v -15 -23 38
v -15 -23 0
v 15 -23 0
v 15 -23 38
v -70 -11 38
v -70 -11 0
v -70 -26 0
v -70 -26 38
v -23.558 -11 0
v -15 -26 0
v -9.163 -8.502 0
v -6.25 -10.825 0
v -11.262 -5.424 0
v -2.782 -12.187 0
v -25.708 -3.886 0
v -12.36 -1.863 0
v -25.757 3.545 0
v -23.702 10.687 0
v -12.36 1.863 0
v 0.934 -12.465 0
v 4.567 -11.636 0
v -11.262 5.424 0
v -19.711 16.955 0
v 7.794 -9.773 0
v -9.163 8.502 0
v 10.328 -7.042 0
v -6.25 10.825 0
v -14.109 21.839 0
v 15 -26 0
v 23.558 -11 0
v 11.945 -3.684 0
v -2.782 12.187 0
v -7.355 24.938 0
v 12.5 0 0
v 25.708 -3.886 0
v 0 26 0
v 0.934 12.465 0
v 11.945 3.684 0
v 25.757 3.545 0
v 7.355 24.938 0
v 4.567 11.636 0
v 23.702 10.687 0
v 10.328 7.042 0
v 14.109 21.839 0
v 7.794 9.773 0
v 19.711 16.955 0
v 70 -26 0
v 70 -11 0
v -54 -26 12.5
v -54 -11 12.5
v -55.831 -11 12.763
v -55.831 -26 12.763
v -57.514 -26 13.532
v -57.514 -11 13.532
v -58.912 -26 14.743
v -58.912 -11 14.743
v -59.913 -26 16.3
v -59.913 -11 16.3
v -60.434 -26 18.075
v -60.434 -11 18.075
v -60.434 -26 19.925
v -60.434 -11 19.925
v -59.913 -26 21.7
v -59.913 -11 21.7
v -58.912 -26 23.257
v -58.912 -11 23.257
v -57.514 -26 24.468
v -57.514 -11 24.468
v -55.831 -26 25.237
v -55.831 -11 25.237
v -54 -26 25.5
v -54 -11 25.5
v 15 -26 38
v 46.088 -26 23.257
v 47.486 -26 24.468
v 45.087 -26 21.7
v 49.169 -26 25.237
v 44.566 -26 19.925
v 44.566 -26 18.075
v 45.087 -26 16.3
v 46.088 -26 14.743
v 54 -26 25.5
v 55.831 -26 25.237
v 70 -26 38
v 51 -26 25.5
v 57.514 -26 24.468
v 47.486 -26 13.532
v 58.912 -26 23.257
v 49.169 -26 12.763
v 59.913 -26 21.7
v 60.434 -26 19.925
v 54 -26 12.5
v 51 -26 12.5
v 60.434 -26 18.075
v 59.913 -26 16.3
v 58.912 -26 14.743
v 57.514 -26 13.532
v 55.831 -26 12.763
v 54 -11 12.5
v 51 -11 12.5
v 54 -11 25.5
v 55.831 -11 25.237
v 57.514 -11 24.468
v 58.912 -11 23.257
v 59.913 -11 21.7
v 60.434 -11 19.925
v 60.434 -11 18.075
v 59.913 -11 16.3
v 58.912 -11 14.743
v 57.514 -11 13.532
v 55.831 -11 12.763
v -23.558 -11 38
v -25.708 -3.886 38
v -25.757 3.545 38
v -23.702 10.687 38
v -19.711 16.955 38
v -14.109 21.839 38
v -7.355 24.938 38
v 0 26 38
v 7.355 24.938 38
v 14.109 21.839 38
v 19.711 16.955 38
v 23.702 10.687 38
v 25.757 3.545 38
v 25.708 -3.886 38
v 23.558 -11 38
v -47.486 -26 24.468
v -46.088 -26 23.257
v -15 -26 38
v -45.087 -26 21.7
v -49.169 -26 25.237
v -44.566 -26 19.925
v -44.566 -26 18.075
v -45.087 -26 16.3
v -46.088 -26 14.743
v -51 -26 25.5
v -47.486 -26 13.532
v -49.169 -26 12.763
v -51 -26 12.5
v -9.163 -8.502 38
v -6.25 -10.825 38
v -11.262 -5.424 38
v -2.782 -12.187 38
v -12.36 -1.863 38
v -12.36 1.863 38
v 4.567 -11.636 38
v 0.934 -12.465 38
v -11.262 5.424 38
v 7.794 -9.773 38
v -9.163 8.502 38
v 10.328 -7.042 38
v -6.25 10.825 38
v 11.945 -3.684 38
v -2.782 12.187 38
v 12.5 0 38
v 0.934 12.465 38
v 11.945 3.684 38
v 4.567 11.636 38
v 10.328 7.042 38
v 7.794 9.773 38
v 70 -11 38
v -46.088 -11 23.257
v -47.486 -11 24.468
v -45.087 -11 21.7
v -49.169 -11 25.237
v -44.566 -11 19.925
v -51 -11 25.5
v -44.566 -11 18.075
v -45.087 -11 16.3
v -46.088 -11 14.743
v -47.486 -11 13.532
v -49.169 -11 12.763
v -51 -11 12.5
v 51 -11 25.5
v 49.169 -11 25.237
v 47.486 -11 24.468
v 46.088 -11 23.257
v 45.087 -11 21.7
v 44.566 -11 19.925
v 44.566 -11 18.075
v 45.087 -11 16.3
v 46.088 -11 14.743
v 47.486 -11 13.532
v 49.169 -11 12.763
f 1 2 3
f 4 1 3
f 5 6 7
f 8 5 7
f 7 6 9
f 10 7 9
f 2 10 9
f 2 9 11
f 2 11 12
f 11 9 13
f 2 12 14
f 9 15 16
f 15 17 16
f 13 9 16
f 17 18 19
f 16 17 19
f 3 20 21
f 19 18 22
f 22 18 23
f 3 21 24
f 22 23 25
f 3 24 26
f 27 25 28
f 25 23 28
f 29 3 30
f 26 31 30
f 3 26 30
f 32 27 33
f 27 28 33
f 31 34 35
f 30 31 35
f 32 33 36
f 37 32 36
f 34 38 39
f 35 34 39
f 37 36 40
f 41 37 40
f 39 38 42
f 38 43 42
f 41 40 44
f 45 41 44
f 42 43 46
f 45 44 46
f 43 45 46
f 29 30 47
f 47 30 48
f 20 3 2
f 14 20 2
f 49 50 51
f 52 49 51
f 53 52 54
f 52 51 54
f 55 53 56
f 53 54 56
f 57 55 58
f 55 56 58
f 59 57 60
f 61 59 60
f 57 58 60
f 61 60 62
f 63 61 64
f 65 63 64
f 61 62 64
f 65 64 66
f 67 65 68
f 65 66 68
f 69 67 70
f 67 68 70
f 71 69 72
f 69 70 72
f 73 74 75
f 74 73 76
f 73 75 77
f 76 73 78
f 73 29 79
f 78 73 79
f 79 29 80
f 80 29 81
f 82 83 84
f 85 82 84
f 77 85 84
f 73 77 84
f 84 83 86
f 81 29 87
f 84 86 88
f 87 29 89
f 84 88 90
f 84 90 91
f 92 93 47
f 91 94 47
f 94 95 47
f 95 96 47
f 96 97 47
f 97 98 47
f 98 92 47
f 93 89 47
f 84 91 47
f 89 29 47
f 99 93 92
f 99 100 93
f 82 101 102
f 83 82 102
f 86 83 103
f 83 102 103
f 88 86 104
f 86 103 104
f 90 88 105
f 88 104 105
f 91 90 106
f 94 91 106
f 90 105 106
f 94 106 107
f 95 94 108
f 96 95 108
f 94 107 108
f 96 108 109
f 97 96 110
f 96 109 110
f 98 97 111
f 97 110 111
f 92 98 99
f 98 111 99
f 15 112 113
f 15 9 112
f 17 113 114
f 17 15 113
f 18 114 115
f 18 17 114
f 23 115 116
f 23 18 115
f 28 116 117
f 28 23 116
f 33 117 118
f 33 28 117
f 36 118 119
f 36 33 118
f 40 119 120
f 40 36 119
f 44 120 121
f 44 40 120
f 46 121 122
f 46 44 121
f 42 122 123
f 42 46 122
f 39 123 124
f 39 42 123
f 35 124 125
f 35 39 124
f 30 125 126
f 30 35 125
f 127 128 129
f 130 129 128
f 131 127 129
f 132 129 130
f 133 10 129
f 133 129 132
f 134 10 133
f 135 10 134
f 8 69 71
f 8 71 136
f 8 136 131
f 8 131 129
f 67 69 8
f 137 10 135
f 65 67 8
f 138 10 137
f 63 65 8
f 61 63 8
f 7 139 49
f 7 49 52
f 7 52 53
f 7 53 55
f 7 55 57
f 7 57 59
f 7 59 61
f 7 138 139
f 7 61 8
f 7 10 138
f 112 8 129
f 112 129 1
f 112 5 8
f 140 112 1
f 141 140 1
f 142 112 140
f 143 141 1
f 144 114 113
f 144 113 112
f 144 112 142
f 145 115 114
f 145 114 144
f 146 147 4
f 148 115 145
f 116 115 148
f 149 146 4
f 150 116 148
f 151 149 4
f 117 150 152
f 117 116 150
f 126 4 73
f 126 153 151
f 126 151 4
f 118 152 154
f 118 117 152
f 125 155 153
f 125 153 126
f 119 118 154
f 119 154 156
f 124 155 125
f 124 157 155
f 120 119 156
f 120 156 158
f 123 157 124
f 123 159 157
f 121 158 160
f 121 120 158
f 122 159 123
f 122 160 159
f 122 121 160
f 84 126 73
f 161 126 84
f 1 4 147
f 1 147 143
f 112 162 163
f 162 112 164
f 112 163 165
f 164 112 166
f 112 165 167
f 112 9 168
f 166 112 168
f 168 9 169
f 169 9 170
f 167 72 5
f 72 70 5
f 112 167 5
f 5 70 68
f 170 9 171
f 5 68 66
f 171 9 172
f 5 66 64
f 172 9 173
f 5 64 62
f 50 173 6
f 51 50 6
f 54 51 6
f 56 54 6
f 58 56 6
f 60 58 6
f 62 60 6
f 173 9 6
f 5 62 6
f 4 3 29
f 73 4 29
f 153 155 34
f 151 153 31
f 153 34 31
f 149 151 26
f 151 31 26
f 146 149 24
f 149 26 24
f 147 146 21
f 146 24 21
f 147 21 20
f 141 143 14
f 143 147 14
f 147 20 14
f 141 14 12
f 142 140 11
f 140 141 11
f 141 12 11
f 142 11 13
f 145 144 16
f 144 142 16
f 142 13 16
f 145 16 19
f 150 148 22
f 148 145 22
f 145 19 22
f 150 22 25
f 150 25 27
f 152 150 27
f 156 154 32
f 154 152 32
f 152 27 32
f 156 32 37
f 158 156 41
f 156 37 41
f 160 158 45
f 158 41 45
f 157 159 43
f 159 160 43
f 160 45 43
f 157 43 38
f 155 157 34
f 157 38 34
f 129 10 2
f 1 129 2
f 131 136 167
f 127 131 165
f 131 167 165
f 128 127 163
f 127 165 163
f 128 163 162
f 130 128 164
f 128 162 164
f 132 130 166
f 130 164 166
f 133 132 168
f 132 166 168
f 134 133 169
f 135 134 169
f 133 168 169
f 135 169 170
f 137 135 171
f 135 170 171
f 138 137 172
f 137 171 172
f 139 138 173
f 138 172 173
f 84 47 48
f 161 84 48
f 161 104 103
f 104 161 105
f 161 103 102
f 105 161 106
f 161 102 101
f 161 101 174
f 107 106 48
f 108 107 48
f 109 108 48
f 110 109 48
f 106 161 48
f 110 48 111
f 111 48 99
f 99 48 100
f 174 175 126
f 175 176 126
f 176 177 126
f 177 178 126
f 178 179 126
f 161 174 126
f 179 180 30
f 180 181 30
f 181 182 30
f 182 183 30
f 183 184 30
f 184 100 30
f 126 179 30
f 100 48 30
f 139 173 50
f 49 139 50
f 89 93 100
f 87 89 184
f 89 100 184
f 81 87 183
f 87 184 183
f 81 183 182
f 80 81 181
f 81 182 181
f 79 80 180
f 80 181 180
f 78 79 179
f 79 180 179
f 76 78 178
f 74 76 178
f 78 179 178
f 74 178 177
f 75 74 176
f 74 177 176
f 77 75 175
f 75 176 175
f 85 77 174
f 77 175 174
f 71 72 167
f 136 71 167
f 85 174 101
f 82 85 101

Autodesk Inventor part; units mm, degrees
ref_plane "YZ Plane" through (0, 0, 0) normal (1, 0, 0) x (0, 1, 0)
ref_plane "XZ Plane" through (0, 0, 0) normal (0, 1, 0) x (-1, 0, 0)
ref_plane "XY Plane" through (0, 0, 0) normal (0, 0, 1) x (1, 0, 0)
sketch "Эскиз1" plane through (0, 0, 0) normal (0, 0, 1) x (1, 0, 0)
  circle A0 centre (0, 0) radius 12.5
  circle A1 centre (0, 0) radius 26
  line L0 (0, -26) -> (-70, -26)
  line L1 (-70, -26) -> (70, -26)
  line L2 (70, -26) -> (70, -11)
  line L3 (70, -11) -> (-70, -11)
  line L4 (-70, -11) -> (-70, -26)
  line L5 (0, -26) -> (-15, -26)
  line L6 (-15, -26) -> (-15, -23)
  line L7 (-15, -23) -> (15, -23)
  line L8 (15, -23) -> (15, -26)
  point P0 (23.5584, -11)
  point P1 (-23.5584, -11)
  dimension "d1" = 52
  dimension "d0" = 25
  dimension "d2" = 70
  dimension "d5" = 15
  dimension "d6" = 15
  dimension "d7" = 3
  dimension "d8" = 30
extrude "Выдавливание1" add sketch "Эскиз1" along normal blind 38 contours A0 L3 A1 | A0 L3 A1 L7 | A1 L7 L6 L0 L4 L3 | L3 L2 L1 L8 L7 A1
sketch "Эскиз2" plane through (-70, -11, 0) normal (0, 1, 0) x (1, 0, 0)
  line L0 (0, 0) -> (0, -38) projected
  line L1 (85, 0) -> (140, 0) projected
  line L2 (0, -38) -> (140, -38)
  line L3 (140, -38) -> (140, 0)
  line L4 (140, 0) -> (0, 0)
  line L5 (0, 0) -> (0, -38)
  line L6 (70, 0) -> (70, -38)
  line L7 (70, -19) -> (122.5, -19)
  line L8 (122.5, -19) -> (17.5, -19)
  line L9 (17.5, -19) -> (19, -19)
  line L10 (19, -19) -> (16, -19)
  arc A0 (16, -12.5) -> (16, -25.5) centre (16, -19) ccw
  arc A1 (19, -25.5) -> (19, -12.5) centre (19, -19) ccw
  line L11 (16, -25.5) -> (19, -25.5)
  line L12 (19, -12.5) -> (16, -12.5)
  line L13 (122.5, -19) -> (121, -19)
  line L14 (121, -19) -> (124, -19)
  arc A2 (124, -25.5) -> (124, -12.5) centre (124, -19) ccw
  arc A3 (121, -12.5) -> (121, -25.5) centre (121, -19) ccw
  line L15 (121, -25.5) -> (124, -25.5)
  line L16 (121, -12.5) -> (124, -12.5)
  dimension "d11" = 52.5
  dimension "d12" = 105
  dimension "d13" = 1.5
  dimension "d14" = 3
  dimension "d15" = 13
  dimension "d16" = 1.5
  dimension "d17" = 3
extrude "Выдавливание2" cut sketch "Эскиз2" against normal blind 53.75 contours A1 L11 A0 L12 | A3 L16 A2 L15
properties part number "Подшипник качения 25 мм ГОСТ 8338-75"
